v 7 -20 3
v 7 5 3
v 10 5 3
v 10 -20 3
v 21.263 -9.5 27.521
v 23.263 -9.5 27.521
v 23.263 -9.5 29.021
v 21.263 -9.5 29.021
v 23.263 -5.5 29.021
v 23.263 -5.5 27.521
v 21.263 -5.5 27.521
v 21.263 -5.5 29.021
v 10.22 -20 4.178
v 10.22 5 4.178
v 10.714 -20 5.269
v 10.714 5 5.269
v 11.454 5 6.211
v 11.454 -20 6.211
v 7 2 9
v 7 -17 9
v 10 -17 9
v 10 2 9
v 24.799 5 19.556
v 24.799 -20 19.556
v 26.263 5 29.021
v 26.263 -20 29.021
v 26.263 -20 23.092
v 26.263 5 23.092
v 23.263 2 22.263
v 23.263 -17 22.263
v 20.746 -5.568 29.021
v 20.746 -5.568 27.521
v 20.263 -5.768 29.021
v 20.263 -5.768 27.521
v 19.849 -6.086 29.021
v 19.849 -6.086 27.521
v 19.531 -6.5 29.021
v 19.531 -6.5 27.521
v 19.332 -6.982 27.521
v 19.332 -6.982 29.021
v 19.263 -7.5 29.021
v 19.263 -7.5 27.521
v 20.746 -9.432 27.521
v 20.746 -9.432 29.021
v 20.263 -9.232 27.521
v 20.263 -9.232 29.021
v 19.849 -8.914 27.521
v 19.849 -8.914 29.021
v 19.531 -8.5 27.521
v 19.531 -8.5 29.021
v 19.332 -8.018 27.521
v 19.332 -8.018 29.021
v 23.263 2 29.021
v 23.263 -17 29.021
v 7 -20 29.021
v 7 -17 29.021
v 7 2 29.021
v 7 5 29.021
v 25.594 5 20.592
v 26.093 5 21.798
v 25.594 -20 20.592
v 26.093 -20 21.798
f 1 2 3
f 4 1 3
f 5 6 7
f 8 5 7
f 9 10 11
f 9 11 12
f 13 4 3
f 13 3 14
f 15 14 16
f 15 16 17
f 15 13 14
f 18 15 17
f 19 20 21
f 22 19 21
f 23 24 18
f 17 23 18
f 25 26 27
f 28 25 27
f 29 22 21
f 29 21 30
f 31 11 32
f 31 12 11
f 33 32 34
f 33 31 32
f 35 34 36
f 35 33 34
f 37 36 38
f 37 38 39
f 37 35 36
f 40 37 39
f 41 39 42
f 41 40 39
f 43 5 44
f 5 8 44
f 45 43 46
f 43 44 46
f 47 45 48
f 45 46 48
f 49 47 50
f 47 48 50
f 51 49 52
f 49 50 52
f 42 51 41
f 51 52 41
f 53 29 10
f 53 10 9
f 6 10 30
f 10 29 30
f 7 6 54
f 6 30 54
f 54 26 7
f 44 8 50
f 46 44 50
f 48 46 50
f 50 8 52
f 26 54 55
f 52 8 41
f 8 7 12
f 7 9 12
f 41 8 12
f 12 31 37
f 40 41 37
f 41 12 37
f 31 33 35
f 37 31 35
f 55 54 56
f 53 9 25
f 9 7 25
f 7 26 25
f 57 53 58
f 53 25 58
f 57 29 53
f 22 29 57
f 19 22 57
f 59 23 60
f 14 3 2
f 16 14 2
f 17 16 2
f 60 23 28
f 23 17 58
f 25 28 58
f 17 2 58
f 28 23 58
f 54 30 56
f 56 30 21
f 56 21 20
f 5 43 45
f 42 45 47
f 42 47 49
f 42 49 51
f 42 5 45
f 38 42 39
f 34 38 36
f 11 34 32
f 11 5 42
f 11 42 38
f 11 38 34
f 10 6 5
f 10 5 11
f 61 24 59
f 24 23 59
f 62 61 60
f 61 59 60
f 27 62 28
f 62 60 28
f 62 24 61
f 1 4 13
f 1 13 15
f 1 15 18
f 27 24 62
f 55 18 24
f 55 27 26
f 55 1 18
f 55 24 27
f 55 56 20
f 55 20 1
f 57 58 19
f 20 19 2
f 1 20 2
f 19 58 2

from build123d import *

# Parameters (mm, degrees)
SKETCH_1_W          = 10
SKETCH_1_H          = 15
EXTRUDE_1_DEPTH     = 3
SKETCH_2_W          = 3
SKETCH_2_H          = 25
EXTRUDE_2_DEPTH     = 6
EXTRUDE_3_DEPTH     = 25
EXTRUDE_4_DEPTH     = 3
EXTRUDE_5_DEPTH     = 3
FILLET_1_R          = 5
SKETCH_6_W          = 10
SKETCH_6_H          = 15
CUT_EXTRUDE_1_DEPTH = 3
FILLET_2_R          = 5
SKETCH_7_W          = 1.5
SKETCH_7_H          = 4
EXTRUDE_6_DEPTH     = 4
FILLET_3_R          = 2


# Some blends are built 0.0001 mm under size
with BuildPart() as part:
    # 草图1 → 凸台-拉伸1 (new body)
    with BuildSketch(Plane.XY):
        with Locations((5, -7.5)):
            Rectangle(SKETCH_1_W, SKETCH_1_H)
    extrude(amount=EXTRUDE_1_DEPTH)

    # 草图2 → 凸台-拉伸2 (add)
    with BuildSketch(Plane.XY.offset(3)):
        with Locations((8.5, -7.5)):
            Rectangle(SKETCH_2_W, SKETCH_2_H)
    extrude(amount=EXTRUDE_2_DEPTH)

    # 草图3 → 凸台-拉伸3 (add)
    with BuildSketch(Plane(origin=(0, -20, 0), x_dir=(-1, 0, 0), z_dir=(0, -1, 0))):
        Polygon((-10, -9), (-23.263455967, -22.263455967), (-23.263455967, -29.02081528), (-26.263455967, -29.02081528), (-26.263455967, -21.02081528), (-10, -4.757359313), align=None)
    extrude(amount=-EXTRUDE_3_DEPTH)

    # 草图4 → 凸台-拉伸4 (add)
    with BuildSketch(Plane(origin=(0, -20, 0), x_dir=(-1, 0, 0), z_dir=(0, -1, 0))):
        Polygon((-7, -9), (-10, -9), (-23.263455967, -22.263455967), (-23.263455967, -29.02081528), (-7, -29.02081528), align=None)
    extrude(amount=-EXTRUDE_4_DEPTH)

    # 草图5 → 凸台-拉伸5 (add)
    with BuildSketch(Plane(origin=(0, 5, 0), x_dir=(1, 0, 0), z_dir=(0, 1, 0))):
        Polygon((7, -9), (10, -9), (23.263455967, -22.263455967), (23.263455967, -29.02081528), (7, -29.02081528), align=None)
    extrude(amount=-EXTRUDE_5_DEPTH)

    # 圆角1
    fillet_1_edges = [part.edges().sort_by_distance(p)[0] for p in [
        (26.263455967, -7.5, 21.02081528),
    ]]
    fillet(fillet_1_edges, radius=FILLET_1_R)

    # 草图6 → 切除-拉伸1 (cut)
    with BuildSketch(Plane(origin=(0, 0, 0), x_dir=(-1, 0, 0), z_dir=(0, 0, -1))):
        with Locations((-5, -7.5)):
            Rectangle(SKETCH_6_W, SKETCH_6_H)
    extrude(amount=-CUT_EXTRUDE_1_DEPTH, mode=Mode.SUBTRACT)

    # 圆角2
    # the kernel refuses this fillet: 5 mm, written as the material it adds along each edge
    with BuildSketch(Plane(origin=(10, -20, 4.757359313), x_dir=(0, 0, -1), z_dir=(0, 1, 0))) as fillet_2_piece_1:
        with BuildLine():
            CenterArc((2.08159154, -4.989476271), FILLET_2_R, 93.718036518, 41.281963482)
            Line((-1.453942365, -1.453942365), (-1.524653044, -1.383231687))
            Line((-1.524653044, -1.383231687), (-0.070710678, 0.070710678))
            Line((-0.070710678, 0.070710678), (0, 0.1))
            ThreePointArc((0, 0.1), (0.878679656, 0.1), (1.750874668, 0.099789525))
            Line((1.750874668, 0.099789525), (1.757359313, 0))
        make_face()
    extrude(amount=25)

    # 草图7 → 凸台-拉伸6 (add)
    with BuildSketch(Plane.ZY.offset(-23.263455967)):
        with Locations((28.27081528, -7.5)):
            Rectangle(SKETCH_7_W, SKETCH_7_H)
    extrude(amount=EXTRUDE_6_DEPTH)

    # 圆角3
    fillet_3_edges = [part.edges().sort_by_distance(p)[0] for p in [
        (19.263455967, -9.5, 28.27081528),
        (19.263455967, -5.5, 28.27081528),
    ]]
    fillet(fillet_3_edges, radius=FILLET_3_R - 0.0001)  # a hair under: the kernel refuses the full size


solid = part.part
